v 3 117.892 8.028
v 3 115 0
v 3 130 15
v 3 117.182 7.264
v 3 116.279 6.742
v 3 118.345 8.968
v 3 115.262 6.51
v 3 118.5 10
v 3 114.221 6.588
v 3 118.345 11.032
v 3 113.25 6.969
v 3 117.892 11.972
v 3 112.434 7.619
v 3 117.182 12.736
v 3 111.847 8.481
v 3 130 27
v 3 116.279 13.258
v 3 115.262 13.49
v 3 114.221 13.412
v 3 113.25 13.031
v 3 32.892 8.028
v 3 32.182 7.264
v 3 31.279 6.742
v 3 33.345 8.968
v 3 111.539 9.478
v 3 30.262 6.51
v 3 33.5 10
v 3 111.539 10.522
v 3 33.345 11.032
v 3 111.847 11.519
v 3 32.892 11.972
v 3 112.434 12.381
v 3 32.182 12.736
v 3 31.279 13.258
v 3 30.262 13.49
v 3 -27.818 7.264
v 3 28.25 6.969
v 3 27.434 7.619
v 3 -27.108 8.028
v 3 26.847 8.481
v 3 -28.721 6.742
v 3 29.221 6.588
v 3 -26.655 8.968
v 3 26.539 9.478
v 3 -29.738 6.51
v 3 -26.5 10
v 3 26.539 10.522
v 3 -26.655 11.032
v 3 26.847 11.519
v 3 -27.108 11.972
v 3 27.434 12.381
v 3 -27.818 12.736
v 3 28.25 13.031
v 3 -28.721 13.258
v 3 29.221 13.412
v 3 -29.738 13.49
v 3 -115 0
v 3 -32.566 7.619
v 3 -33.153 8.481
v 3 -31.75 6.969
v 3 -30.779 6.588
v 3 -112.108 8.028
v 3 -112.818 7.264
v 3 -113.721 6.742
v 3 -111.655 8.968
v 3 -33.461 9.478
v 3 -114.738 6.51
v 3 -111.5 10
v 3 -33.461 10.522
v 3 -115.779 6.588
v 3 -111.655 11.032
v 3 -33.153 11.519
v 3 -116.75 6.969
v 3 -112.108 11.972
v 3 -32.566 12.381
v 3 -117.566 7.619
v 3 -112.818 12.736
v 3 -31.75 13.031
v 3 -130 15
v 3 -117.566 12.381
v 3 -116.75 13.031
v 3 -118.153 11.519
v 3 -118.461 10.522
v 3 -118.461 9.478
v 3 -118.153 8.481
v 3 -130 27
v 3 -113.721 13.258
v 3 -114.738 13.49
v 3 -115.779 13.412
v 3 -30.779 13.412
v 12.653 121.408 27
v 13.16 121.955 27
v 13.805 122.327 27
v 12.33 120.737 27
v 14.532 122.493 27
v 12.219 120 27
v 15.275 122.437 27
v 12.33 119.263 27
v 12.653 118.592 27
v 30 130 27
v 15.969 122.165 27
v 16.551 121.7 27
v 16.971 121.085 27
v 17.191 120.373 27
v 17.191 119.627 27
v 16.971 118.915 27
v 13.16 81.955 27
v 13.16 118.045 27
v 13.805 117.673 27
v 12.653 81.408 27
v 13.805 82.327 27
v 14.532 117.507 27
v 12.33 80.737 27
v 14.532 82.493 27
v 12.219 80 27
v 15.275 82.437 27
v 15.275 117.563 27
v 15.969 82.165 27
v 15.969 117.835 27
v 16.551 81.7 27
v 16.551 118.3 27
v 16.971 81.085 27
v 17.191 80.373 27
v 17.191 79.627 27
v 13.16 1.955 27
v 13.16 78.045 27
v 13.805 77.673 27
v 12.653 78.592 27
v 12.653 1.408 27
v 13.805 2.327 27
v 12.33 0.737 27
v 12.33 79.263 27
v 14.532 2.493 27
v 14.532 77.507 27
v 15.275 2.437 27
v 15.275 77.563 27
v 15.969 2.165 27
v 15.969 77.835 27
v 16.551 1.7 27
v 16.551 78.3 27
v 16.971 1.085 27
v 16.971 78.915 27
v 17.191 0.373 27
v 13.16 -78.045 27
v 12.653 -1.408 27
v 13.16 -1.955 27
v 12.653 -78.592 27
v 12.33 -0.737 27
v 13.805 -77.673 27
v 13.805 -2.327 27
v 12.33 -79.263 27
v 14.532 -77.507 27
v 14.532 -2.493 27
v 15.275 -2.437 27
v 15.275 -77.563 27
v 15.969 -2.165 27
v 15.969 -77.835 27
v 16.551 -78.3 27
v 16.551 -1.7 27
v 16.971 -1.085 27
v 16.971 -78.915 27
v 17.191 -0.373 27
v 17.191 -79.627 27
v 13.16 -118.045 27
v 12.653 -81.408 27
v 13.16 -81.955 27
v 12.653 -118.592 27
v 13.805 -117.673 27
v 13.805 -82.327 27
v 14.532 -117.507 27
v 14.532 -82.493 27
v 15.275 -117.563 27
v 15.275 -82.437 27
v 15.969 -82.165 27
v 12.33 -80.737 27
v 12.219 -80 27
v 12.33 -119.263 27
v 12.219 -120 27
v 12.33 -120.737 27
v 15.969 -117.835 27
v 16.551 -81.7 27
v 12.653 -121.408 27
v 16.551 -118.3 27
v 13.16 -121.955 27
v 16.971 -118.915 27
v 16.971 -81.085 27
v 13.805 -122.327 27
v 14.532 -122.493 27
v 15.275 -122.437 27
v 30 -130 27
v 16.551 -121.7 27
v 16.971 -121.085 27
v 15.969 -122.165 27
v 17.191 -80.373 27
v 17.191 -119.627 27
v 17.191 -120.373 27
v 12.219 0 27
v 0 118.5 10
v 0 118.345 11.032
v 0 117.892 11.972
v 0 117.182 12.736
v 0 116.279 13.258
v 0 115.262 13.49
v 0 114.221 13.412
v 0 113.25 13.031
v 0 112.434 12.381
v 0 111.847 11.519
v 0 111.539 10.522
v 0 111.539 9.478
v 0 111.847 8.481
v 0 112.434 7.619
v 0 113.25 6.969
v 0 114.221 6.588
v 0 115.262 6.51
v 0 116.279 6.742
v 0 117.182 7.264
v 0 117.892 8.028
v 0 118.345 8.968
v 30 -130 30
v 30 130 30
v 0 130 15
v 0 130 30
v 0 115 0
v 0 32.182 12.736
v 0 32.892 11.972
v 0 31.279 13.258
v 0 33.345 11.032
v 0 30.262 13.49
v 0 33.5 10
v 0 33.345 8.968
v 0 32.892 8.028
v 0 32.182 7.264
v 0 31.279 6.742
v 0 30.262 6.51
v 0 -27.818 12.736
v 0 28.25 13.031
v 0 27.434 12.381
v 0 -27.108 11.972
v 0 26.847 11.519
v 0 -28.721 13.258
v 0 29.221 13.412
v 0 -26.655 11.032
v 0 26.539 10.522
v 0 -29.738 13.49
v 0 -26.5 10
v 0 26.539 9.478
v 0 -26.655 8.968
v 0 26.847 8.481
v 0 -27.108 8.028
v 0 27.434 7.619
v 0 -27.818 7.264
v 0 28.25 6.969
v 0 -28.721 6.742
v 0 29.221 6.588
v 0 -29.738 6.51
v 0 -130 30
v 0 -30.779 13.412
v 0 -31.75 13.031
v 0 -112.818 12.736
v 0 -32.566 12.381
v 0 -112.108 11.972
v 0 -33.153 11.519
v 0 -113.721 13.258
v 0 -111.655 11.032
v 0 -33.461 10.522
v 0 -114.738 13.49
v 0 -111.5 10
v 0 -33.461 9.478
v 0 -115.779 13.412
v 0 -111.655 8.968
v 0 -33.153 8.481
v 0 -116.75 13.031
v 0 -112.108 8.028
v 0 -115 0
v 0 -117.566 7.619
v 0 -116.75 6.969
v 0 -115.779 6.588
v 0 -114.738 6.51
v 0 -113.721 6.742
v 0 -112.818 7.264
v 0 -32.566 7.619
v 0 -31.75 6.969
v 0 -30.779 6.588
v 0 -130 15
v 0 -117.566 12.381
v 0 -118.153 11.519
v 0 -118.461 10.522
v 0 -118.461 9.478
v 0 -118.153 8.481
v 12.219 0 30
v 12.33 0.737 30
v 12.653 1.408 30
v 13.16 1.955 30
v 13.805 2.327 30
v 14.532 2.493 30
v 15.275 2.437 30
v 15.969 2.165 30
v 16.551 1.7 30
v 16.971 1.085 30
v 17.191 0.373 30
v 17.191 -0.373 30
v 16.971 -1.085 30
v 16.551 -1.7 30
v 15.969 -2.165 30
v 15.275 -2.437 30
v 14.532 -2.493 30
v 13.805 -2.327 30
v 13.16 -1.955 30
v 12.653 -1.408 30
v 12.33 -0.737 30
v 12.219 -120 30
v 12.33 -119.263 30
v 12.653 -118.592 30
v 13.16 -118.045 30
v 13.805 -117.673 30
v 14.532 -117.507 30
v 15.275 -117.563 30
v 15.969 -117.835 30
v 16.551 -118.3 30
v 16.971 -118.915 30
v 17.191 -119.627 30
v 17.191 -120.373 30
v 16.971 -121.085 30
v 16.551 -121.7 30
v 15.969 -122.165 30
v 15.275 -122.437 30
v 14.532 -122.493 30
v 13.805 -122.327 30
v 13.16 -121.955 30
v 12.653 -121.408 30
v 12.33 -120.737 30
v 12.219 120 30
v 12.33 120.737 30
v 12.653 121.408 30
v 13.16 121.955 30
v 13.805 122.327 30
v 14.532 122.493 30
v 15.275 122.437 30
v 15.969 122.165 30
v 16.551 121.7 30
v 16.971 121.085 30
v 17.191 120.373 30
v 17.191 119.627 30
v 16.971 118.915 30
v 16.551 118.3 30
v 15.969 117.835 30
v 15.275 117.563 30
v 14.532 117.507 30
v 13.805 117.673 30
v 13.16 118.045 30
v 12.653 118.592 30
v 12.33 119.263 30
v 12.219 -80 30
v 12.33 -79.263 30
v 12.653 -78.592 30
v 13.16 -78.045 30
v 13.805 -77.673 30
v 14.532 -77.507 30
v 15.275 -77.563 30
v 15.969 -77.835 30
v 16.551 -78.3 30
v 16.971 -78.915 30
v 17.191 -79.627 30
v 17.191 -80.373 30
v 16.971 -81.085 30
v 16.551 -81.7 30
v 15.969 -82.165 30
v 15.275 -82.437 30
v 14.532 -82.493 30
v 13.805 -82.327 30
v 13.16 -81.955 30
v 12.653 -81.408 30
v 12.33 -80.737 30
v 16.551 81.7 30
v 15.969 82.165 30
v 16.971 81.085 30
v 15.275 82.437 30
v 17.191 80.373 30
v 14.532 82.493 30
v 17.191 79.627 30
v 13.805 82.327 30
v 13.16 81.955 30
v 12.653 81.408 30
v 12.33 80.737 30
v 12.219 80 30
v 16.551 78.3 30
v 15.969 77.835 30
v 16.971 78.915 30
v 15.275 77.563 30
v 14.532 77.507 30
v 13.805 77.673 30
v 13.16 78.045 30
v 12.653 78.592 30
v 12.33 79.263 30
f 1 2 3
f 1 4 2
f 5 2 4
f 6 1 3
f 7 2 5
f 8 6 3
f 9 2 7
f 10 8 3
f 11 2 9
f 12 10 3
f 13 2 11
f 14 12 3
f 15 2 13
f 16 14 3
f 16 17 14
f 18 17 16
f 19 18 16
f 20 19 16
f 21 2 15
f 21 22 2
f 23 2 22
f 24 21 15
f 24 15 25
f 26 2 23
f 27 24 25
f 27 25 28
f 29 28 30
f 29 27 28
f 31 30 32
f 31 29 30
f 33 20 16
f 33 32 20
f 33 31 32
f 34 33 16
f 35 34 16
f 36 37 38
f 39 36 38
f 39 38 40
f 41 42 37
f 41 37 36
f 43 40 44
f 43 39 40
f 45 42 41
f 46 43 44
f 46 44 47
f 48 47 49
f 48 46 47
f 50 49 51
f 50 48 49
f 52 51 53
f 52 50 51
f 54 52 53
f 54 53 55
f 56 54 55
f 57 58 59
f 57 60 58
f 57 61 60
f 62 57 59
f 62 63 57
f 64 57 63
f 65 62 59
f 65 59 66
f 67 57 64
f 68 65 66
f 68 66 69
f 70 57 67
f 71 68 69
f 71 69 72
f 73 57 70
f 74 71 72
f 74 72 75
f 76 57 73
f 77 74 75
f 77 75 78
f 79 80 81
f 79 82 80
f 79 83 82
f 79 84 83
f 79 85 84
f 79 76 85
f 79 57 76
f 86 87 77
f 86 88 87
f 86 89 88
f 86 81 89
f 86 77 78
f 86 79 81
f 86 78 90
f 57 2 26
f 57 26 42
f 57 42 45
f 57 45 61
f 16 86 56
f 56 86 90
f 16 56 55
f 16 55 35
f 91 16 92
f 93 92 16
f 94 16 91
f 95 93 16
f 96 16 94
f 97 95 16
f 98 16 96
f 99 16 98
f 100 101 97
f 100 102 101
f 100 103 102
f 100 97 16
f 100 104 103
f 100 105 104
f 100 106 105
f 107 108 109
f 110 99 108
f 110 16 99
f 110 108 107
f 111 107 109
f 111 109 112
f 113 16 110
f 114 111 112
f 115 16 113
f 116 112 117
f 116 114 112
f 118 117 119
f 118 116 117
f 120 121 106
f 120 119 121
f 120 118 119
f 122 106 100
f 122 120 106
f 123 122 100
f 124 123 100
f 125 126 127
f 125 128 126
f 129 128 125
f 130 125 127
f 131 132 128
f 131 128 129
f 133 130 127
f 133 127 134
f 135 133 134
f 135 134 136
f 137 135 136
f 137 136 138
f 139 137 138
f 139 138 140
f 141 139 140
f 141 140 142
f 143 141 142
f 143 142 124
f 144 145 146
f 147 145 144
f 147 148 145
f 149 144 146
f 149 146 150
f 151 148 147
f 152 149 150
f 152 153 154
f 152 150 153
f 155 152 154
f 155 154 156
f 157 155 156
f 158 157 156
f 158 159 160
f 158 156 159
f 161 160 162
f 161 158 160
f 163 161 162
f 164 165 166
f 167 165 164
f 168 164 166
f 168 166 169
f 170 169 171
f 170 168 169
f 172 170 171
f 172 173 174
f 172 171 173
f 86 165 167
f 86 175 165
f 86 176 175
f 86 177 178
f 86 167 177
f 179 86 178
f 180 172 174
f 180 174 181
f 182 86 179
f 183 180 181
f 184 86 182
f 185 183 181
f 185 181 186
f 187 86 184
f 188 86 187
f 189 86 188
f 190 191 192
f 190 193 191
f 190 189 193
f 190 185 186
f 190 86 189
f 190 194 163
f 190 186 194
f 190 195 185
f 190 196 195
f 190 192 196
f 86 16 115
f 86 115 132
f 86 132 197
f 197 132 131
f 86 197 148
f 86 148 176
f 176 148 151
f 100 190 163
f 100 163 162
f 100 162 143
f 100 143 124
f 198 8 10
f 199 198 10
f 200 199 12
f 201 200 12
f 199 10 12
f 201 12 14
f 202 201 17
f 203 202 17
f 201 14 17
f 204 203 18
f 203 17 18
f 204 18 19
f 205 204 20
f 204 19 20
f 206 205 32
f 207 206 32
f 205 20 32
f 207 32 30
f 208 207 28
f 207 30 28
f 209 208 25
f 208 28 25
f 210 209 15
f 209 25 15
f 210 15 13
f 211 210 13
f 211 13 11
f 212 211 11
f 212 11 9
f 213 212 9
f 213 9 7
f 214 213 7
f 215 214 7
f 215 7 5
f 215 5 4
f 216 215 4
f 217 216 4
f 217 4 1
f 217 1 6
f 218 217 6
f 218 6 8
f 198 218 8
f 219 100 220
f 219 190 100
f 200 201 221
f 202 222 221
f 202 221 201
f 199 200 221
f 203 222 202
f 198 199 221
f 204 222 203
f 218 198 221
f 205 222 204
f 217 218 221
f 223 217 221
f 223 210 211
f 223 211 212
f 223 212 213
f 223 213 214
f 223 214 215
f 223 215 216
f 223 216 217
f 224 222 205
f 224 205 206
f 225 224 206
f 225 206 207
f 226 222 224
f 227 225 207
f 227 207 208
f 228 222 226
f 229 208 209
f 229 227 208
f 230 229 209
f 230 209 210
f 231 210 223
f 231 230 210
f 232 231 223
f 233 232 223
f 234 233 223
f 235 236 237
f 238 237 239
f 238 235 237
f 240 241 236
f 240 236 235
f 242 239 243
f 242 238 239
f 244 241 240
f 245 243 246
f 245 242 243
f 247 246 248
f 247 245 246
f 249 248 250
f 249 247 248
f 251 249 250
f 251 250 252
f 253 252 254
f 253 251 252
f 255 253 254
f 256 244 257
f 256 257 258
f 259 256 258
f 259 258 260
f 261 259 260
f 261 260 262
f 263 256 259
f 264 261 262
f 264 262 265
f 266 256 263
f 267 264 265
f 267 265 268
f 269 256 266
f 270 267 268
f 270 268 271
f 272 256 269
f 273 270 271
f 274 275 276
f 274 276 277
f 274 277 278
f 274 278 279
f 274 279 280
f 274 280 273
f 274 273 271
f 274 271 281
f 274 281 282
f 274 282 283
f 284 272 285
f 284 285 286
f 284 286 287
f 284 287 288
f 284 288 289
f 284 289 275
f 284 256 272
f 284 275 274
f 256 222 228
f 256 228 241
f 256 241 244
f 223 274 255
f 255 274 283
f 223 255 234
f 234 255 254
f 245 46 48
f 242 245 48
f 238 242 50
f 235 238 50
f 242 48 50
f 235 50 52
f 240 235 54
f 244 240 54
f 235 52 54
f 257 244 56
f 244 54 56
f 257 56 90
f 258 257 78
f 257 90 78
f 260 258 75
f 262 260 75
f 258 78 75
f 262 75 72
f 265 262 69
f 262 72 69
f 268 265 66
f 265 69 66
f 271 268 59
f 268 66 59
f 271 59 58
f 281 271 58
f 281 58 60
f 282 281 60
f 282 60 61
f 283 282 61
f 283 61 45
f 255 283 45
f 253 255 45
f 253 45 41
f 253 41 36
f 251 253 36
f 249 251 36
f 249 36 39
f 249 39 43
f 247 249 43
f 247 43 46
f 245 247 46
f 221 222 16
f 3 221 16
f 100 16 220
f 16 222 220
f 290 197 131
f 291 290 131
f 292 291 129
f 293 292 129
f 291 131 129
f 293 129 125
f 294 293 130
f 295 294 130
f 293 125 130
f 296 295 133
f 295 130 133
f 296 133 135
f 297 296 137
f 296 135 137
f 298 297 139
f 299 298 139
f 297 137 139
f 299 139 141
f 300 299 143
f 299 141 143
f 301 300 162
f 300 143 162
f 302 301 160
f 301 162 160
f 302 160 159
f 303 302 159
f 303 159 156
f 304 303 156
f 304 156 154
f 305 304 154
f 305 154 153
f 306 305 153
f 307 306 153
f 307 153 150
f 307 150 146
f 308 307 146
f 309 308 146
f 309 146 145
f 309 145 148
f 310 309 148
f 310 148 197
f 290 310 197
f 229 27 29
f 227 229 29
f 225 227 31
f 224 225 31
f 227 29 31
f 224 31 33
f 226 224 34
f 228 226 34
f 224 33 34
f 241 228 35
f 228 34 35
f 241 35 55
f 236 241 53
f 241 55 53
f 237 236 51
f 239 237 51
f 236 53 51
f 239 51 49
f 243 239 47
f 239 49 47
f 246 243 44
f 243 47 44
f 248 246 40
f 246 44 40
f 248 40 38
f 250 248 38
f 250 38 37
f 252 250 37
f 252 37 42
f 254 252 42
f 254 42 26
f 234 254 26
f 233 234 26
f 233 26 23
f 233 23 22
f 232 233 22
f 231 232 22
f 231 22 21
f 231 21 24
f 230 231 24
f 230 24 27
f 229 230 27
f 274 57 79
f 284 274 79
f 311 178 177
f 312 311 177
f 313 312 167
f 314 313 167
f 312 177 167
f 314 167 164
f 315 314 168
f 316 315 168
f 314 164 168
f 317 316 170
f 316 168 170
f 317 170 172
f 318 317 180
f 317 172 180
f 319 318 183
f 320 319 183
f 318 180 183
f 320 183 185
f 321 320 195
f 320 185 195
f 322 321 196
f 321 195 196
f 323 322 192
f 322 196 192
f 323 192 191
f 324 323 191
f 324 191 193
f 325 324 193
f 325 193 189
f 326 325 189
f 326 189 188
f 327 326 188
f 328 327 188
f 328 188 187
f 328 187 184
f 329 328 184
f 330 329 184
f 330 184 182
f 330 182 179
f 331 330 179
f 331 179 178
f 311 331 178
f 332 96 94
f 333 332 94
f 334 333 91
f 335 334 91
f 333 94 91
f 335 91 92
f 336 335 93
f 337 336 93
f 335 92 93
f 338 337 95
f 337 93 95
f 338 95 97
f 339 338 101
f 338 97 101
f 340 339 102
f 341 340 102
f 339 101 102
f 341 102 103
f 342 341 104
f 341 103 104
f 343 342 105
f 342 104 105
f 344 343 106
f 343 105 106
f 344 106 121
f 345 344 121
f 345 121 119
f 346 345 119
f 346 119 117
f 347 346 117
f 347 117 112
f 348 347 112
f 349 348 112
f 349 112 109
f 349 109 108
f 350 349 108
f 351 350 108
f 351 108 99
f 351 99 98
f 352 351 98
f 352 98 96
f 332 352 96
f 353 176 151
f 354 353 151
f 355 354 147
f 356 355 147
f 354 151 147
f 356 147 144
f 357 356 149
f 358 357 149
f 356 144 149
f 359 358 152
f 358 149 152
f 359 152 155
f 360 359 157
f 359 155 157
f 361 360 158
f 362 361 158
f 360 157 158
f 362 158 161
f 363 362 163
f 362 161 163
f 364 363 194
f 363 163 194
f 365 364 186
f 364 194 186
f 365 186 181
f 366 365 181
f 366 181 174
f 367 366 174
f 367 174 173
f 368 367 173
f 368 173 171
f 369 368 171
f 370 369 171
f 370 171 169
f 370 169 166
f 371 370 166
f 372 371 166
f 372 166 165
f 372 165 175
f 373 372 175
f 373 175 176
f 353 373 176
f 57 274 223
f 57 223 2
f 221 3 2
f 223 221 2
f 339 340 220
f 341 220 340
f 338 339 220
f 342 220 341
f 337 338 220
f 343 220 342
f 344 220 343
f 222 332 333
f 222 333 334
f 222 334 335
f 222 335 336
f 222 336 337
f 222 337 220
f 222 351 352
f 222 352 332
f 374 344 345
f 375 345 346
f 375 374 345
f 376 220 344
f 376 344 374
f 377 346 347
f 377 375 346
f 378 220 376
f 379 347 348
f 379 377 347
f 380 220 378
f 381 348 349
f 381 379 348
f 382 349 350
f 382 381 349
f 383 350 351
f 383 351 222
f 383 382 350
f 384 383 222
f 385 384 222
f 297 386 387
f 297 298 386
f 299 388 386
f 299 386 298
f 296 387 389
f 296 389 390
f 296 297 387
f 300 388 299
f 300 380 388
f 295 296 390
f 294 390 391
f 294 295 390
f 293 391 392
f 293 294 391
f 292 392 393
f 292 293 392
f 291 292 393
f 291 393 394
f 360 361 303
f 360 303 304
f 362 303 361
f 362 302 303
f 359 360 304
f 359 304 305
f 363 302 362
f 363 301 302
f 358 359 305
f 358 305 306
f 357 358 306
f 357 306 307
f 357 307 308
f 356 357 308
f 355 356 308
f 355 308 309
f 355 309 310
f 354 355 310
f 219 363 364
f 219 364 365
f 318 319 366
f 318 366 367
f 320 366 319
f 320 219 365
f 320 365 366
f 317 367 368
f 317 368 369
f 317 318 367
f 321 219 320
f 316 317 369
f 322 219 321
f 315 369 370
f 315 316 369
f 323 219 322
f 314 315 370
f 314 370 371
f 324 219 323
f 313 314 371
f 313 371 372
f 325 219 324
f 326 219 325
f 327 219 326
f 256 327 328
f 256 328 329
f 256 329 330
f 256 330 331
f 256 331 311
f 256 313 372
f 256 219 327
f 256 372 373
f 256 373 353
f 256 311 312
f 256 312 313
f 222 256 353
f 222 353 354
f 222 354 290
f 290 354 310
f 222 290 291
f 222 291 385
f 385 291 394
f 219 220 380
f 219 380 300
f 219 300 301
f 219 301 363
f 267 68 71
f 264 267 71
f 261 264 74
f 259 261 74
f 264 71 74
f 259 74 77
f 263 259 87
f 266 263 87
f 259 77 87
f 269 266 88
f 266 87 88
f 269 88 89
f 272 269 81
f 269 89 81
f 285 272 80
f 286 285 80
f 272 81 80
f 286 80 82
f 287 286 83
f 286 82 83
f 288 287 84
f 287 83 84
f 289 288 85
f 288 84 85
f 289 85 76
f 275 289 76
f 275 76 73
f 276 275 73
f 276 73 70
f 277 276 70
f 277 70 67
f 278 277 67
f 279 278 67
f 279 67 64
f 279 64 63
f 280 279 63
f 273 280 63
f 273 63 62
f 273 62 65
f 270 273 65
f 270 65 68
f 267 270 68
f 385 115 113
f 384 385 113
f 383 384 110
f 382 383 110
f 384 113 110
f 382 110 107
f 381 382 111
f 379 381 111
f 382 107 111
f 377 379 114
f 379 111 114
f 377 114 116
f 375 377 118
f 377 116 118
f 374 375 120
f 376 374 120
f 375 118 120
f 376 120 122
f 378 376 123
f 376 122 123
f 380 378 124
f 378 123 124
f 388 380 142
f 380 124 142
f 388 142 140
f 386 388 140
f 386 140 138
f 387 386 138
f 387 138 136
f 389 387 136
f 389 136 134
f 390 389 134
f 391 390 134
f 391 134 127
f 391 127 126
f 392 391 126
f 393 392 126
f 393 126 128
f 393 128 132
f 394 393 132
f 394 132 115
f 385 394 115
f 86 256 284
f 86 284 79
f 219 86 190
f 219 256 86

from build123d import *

# Parameters (mm, degrees)
F1_DEPTH = 130
F3_D     = 7
F5_D     = 5
F7_DEPTH = 25


# Not quite as in the source:
# - a feature names something its author has since deleted; it is built from what else it names


with BuildPart() as f1:
    # F0 (on Front) → F1 (new body, symmetric)
    with BuildSketch(Plane.XZ):
        Polygon((0, 30), (0, 0), (3, 0), (3, 27), (30, 27), (30, 30), align=None)
    extrude(amount=F1_DEPTH, both=True)

    # F3 (through all)
    with Locations(Plane(origin=(0, 0, 0), x_dir=(0, -1, 0), z_dir=(-1, 0, 0))):
        with Locations((-115, 10), (-30, 10), (30, 10), (115, 10)):
            Hole(F3_D / 2)

    # F5 (through all)
    with Locations(Plane.XY.offset(30)):
        with Locations((14.7187495604, -120), (14.7187495604, -80), (14.7187495604, 0), (14.7187495604, 80), (14.7187495604, 120)):
            Hole(F5_D / 2)

    # F6 (on face) → F7 (cut)
    with BuildSketch(Plane.YZ.offset(3)):
        Polygon((-130, 15), (-130, 0), (-115, 0), align=None)
        Polygon((130, 15), (115, 0), (130, 0), align=None)
    extrude(amount=-F7_DEPTH, mode=Mode.SUBTRACT)


solid = f1.part
